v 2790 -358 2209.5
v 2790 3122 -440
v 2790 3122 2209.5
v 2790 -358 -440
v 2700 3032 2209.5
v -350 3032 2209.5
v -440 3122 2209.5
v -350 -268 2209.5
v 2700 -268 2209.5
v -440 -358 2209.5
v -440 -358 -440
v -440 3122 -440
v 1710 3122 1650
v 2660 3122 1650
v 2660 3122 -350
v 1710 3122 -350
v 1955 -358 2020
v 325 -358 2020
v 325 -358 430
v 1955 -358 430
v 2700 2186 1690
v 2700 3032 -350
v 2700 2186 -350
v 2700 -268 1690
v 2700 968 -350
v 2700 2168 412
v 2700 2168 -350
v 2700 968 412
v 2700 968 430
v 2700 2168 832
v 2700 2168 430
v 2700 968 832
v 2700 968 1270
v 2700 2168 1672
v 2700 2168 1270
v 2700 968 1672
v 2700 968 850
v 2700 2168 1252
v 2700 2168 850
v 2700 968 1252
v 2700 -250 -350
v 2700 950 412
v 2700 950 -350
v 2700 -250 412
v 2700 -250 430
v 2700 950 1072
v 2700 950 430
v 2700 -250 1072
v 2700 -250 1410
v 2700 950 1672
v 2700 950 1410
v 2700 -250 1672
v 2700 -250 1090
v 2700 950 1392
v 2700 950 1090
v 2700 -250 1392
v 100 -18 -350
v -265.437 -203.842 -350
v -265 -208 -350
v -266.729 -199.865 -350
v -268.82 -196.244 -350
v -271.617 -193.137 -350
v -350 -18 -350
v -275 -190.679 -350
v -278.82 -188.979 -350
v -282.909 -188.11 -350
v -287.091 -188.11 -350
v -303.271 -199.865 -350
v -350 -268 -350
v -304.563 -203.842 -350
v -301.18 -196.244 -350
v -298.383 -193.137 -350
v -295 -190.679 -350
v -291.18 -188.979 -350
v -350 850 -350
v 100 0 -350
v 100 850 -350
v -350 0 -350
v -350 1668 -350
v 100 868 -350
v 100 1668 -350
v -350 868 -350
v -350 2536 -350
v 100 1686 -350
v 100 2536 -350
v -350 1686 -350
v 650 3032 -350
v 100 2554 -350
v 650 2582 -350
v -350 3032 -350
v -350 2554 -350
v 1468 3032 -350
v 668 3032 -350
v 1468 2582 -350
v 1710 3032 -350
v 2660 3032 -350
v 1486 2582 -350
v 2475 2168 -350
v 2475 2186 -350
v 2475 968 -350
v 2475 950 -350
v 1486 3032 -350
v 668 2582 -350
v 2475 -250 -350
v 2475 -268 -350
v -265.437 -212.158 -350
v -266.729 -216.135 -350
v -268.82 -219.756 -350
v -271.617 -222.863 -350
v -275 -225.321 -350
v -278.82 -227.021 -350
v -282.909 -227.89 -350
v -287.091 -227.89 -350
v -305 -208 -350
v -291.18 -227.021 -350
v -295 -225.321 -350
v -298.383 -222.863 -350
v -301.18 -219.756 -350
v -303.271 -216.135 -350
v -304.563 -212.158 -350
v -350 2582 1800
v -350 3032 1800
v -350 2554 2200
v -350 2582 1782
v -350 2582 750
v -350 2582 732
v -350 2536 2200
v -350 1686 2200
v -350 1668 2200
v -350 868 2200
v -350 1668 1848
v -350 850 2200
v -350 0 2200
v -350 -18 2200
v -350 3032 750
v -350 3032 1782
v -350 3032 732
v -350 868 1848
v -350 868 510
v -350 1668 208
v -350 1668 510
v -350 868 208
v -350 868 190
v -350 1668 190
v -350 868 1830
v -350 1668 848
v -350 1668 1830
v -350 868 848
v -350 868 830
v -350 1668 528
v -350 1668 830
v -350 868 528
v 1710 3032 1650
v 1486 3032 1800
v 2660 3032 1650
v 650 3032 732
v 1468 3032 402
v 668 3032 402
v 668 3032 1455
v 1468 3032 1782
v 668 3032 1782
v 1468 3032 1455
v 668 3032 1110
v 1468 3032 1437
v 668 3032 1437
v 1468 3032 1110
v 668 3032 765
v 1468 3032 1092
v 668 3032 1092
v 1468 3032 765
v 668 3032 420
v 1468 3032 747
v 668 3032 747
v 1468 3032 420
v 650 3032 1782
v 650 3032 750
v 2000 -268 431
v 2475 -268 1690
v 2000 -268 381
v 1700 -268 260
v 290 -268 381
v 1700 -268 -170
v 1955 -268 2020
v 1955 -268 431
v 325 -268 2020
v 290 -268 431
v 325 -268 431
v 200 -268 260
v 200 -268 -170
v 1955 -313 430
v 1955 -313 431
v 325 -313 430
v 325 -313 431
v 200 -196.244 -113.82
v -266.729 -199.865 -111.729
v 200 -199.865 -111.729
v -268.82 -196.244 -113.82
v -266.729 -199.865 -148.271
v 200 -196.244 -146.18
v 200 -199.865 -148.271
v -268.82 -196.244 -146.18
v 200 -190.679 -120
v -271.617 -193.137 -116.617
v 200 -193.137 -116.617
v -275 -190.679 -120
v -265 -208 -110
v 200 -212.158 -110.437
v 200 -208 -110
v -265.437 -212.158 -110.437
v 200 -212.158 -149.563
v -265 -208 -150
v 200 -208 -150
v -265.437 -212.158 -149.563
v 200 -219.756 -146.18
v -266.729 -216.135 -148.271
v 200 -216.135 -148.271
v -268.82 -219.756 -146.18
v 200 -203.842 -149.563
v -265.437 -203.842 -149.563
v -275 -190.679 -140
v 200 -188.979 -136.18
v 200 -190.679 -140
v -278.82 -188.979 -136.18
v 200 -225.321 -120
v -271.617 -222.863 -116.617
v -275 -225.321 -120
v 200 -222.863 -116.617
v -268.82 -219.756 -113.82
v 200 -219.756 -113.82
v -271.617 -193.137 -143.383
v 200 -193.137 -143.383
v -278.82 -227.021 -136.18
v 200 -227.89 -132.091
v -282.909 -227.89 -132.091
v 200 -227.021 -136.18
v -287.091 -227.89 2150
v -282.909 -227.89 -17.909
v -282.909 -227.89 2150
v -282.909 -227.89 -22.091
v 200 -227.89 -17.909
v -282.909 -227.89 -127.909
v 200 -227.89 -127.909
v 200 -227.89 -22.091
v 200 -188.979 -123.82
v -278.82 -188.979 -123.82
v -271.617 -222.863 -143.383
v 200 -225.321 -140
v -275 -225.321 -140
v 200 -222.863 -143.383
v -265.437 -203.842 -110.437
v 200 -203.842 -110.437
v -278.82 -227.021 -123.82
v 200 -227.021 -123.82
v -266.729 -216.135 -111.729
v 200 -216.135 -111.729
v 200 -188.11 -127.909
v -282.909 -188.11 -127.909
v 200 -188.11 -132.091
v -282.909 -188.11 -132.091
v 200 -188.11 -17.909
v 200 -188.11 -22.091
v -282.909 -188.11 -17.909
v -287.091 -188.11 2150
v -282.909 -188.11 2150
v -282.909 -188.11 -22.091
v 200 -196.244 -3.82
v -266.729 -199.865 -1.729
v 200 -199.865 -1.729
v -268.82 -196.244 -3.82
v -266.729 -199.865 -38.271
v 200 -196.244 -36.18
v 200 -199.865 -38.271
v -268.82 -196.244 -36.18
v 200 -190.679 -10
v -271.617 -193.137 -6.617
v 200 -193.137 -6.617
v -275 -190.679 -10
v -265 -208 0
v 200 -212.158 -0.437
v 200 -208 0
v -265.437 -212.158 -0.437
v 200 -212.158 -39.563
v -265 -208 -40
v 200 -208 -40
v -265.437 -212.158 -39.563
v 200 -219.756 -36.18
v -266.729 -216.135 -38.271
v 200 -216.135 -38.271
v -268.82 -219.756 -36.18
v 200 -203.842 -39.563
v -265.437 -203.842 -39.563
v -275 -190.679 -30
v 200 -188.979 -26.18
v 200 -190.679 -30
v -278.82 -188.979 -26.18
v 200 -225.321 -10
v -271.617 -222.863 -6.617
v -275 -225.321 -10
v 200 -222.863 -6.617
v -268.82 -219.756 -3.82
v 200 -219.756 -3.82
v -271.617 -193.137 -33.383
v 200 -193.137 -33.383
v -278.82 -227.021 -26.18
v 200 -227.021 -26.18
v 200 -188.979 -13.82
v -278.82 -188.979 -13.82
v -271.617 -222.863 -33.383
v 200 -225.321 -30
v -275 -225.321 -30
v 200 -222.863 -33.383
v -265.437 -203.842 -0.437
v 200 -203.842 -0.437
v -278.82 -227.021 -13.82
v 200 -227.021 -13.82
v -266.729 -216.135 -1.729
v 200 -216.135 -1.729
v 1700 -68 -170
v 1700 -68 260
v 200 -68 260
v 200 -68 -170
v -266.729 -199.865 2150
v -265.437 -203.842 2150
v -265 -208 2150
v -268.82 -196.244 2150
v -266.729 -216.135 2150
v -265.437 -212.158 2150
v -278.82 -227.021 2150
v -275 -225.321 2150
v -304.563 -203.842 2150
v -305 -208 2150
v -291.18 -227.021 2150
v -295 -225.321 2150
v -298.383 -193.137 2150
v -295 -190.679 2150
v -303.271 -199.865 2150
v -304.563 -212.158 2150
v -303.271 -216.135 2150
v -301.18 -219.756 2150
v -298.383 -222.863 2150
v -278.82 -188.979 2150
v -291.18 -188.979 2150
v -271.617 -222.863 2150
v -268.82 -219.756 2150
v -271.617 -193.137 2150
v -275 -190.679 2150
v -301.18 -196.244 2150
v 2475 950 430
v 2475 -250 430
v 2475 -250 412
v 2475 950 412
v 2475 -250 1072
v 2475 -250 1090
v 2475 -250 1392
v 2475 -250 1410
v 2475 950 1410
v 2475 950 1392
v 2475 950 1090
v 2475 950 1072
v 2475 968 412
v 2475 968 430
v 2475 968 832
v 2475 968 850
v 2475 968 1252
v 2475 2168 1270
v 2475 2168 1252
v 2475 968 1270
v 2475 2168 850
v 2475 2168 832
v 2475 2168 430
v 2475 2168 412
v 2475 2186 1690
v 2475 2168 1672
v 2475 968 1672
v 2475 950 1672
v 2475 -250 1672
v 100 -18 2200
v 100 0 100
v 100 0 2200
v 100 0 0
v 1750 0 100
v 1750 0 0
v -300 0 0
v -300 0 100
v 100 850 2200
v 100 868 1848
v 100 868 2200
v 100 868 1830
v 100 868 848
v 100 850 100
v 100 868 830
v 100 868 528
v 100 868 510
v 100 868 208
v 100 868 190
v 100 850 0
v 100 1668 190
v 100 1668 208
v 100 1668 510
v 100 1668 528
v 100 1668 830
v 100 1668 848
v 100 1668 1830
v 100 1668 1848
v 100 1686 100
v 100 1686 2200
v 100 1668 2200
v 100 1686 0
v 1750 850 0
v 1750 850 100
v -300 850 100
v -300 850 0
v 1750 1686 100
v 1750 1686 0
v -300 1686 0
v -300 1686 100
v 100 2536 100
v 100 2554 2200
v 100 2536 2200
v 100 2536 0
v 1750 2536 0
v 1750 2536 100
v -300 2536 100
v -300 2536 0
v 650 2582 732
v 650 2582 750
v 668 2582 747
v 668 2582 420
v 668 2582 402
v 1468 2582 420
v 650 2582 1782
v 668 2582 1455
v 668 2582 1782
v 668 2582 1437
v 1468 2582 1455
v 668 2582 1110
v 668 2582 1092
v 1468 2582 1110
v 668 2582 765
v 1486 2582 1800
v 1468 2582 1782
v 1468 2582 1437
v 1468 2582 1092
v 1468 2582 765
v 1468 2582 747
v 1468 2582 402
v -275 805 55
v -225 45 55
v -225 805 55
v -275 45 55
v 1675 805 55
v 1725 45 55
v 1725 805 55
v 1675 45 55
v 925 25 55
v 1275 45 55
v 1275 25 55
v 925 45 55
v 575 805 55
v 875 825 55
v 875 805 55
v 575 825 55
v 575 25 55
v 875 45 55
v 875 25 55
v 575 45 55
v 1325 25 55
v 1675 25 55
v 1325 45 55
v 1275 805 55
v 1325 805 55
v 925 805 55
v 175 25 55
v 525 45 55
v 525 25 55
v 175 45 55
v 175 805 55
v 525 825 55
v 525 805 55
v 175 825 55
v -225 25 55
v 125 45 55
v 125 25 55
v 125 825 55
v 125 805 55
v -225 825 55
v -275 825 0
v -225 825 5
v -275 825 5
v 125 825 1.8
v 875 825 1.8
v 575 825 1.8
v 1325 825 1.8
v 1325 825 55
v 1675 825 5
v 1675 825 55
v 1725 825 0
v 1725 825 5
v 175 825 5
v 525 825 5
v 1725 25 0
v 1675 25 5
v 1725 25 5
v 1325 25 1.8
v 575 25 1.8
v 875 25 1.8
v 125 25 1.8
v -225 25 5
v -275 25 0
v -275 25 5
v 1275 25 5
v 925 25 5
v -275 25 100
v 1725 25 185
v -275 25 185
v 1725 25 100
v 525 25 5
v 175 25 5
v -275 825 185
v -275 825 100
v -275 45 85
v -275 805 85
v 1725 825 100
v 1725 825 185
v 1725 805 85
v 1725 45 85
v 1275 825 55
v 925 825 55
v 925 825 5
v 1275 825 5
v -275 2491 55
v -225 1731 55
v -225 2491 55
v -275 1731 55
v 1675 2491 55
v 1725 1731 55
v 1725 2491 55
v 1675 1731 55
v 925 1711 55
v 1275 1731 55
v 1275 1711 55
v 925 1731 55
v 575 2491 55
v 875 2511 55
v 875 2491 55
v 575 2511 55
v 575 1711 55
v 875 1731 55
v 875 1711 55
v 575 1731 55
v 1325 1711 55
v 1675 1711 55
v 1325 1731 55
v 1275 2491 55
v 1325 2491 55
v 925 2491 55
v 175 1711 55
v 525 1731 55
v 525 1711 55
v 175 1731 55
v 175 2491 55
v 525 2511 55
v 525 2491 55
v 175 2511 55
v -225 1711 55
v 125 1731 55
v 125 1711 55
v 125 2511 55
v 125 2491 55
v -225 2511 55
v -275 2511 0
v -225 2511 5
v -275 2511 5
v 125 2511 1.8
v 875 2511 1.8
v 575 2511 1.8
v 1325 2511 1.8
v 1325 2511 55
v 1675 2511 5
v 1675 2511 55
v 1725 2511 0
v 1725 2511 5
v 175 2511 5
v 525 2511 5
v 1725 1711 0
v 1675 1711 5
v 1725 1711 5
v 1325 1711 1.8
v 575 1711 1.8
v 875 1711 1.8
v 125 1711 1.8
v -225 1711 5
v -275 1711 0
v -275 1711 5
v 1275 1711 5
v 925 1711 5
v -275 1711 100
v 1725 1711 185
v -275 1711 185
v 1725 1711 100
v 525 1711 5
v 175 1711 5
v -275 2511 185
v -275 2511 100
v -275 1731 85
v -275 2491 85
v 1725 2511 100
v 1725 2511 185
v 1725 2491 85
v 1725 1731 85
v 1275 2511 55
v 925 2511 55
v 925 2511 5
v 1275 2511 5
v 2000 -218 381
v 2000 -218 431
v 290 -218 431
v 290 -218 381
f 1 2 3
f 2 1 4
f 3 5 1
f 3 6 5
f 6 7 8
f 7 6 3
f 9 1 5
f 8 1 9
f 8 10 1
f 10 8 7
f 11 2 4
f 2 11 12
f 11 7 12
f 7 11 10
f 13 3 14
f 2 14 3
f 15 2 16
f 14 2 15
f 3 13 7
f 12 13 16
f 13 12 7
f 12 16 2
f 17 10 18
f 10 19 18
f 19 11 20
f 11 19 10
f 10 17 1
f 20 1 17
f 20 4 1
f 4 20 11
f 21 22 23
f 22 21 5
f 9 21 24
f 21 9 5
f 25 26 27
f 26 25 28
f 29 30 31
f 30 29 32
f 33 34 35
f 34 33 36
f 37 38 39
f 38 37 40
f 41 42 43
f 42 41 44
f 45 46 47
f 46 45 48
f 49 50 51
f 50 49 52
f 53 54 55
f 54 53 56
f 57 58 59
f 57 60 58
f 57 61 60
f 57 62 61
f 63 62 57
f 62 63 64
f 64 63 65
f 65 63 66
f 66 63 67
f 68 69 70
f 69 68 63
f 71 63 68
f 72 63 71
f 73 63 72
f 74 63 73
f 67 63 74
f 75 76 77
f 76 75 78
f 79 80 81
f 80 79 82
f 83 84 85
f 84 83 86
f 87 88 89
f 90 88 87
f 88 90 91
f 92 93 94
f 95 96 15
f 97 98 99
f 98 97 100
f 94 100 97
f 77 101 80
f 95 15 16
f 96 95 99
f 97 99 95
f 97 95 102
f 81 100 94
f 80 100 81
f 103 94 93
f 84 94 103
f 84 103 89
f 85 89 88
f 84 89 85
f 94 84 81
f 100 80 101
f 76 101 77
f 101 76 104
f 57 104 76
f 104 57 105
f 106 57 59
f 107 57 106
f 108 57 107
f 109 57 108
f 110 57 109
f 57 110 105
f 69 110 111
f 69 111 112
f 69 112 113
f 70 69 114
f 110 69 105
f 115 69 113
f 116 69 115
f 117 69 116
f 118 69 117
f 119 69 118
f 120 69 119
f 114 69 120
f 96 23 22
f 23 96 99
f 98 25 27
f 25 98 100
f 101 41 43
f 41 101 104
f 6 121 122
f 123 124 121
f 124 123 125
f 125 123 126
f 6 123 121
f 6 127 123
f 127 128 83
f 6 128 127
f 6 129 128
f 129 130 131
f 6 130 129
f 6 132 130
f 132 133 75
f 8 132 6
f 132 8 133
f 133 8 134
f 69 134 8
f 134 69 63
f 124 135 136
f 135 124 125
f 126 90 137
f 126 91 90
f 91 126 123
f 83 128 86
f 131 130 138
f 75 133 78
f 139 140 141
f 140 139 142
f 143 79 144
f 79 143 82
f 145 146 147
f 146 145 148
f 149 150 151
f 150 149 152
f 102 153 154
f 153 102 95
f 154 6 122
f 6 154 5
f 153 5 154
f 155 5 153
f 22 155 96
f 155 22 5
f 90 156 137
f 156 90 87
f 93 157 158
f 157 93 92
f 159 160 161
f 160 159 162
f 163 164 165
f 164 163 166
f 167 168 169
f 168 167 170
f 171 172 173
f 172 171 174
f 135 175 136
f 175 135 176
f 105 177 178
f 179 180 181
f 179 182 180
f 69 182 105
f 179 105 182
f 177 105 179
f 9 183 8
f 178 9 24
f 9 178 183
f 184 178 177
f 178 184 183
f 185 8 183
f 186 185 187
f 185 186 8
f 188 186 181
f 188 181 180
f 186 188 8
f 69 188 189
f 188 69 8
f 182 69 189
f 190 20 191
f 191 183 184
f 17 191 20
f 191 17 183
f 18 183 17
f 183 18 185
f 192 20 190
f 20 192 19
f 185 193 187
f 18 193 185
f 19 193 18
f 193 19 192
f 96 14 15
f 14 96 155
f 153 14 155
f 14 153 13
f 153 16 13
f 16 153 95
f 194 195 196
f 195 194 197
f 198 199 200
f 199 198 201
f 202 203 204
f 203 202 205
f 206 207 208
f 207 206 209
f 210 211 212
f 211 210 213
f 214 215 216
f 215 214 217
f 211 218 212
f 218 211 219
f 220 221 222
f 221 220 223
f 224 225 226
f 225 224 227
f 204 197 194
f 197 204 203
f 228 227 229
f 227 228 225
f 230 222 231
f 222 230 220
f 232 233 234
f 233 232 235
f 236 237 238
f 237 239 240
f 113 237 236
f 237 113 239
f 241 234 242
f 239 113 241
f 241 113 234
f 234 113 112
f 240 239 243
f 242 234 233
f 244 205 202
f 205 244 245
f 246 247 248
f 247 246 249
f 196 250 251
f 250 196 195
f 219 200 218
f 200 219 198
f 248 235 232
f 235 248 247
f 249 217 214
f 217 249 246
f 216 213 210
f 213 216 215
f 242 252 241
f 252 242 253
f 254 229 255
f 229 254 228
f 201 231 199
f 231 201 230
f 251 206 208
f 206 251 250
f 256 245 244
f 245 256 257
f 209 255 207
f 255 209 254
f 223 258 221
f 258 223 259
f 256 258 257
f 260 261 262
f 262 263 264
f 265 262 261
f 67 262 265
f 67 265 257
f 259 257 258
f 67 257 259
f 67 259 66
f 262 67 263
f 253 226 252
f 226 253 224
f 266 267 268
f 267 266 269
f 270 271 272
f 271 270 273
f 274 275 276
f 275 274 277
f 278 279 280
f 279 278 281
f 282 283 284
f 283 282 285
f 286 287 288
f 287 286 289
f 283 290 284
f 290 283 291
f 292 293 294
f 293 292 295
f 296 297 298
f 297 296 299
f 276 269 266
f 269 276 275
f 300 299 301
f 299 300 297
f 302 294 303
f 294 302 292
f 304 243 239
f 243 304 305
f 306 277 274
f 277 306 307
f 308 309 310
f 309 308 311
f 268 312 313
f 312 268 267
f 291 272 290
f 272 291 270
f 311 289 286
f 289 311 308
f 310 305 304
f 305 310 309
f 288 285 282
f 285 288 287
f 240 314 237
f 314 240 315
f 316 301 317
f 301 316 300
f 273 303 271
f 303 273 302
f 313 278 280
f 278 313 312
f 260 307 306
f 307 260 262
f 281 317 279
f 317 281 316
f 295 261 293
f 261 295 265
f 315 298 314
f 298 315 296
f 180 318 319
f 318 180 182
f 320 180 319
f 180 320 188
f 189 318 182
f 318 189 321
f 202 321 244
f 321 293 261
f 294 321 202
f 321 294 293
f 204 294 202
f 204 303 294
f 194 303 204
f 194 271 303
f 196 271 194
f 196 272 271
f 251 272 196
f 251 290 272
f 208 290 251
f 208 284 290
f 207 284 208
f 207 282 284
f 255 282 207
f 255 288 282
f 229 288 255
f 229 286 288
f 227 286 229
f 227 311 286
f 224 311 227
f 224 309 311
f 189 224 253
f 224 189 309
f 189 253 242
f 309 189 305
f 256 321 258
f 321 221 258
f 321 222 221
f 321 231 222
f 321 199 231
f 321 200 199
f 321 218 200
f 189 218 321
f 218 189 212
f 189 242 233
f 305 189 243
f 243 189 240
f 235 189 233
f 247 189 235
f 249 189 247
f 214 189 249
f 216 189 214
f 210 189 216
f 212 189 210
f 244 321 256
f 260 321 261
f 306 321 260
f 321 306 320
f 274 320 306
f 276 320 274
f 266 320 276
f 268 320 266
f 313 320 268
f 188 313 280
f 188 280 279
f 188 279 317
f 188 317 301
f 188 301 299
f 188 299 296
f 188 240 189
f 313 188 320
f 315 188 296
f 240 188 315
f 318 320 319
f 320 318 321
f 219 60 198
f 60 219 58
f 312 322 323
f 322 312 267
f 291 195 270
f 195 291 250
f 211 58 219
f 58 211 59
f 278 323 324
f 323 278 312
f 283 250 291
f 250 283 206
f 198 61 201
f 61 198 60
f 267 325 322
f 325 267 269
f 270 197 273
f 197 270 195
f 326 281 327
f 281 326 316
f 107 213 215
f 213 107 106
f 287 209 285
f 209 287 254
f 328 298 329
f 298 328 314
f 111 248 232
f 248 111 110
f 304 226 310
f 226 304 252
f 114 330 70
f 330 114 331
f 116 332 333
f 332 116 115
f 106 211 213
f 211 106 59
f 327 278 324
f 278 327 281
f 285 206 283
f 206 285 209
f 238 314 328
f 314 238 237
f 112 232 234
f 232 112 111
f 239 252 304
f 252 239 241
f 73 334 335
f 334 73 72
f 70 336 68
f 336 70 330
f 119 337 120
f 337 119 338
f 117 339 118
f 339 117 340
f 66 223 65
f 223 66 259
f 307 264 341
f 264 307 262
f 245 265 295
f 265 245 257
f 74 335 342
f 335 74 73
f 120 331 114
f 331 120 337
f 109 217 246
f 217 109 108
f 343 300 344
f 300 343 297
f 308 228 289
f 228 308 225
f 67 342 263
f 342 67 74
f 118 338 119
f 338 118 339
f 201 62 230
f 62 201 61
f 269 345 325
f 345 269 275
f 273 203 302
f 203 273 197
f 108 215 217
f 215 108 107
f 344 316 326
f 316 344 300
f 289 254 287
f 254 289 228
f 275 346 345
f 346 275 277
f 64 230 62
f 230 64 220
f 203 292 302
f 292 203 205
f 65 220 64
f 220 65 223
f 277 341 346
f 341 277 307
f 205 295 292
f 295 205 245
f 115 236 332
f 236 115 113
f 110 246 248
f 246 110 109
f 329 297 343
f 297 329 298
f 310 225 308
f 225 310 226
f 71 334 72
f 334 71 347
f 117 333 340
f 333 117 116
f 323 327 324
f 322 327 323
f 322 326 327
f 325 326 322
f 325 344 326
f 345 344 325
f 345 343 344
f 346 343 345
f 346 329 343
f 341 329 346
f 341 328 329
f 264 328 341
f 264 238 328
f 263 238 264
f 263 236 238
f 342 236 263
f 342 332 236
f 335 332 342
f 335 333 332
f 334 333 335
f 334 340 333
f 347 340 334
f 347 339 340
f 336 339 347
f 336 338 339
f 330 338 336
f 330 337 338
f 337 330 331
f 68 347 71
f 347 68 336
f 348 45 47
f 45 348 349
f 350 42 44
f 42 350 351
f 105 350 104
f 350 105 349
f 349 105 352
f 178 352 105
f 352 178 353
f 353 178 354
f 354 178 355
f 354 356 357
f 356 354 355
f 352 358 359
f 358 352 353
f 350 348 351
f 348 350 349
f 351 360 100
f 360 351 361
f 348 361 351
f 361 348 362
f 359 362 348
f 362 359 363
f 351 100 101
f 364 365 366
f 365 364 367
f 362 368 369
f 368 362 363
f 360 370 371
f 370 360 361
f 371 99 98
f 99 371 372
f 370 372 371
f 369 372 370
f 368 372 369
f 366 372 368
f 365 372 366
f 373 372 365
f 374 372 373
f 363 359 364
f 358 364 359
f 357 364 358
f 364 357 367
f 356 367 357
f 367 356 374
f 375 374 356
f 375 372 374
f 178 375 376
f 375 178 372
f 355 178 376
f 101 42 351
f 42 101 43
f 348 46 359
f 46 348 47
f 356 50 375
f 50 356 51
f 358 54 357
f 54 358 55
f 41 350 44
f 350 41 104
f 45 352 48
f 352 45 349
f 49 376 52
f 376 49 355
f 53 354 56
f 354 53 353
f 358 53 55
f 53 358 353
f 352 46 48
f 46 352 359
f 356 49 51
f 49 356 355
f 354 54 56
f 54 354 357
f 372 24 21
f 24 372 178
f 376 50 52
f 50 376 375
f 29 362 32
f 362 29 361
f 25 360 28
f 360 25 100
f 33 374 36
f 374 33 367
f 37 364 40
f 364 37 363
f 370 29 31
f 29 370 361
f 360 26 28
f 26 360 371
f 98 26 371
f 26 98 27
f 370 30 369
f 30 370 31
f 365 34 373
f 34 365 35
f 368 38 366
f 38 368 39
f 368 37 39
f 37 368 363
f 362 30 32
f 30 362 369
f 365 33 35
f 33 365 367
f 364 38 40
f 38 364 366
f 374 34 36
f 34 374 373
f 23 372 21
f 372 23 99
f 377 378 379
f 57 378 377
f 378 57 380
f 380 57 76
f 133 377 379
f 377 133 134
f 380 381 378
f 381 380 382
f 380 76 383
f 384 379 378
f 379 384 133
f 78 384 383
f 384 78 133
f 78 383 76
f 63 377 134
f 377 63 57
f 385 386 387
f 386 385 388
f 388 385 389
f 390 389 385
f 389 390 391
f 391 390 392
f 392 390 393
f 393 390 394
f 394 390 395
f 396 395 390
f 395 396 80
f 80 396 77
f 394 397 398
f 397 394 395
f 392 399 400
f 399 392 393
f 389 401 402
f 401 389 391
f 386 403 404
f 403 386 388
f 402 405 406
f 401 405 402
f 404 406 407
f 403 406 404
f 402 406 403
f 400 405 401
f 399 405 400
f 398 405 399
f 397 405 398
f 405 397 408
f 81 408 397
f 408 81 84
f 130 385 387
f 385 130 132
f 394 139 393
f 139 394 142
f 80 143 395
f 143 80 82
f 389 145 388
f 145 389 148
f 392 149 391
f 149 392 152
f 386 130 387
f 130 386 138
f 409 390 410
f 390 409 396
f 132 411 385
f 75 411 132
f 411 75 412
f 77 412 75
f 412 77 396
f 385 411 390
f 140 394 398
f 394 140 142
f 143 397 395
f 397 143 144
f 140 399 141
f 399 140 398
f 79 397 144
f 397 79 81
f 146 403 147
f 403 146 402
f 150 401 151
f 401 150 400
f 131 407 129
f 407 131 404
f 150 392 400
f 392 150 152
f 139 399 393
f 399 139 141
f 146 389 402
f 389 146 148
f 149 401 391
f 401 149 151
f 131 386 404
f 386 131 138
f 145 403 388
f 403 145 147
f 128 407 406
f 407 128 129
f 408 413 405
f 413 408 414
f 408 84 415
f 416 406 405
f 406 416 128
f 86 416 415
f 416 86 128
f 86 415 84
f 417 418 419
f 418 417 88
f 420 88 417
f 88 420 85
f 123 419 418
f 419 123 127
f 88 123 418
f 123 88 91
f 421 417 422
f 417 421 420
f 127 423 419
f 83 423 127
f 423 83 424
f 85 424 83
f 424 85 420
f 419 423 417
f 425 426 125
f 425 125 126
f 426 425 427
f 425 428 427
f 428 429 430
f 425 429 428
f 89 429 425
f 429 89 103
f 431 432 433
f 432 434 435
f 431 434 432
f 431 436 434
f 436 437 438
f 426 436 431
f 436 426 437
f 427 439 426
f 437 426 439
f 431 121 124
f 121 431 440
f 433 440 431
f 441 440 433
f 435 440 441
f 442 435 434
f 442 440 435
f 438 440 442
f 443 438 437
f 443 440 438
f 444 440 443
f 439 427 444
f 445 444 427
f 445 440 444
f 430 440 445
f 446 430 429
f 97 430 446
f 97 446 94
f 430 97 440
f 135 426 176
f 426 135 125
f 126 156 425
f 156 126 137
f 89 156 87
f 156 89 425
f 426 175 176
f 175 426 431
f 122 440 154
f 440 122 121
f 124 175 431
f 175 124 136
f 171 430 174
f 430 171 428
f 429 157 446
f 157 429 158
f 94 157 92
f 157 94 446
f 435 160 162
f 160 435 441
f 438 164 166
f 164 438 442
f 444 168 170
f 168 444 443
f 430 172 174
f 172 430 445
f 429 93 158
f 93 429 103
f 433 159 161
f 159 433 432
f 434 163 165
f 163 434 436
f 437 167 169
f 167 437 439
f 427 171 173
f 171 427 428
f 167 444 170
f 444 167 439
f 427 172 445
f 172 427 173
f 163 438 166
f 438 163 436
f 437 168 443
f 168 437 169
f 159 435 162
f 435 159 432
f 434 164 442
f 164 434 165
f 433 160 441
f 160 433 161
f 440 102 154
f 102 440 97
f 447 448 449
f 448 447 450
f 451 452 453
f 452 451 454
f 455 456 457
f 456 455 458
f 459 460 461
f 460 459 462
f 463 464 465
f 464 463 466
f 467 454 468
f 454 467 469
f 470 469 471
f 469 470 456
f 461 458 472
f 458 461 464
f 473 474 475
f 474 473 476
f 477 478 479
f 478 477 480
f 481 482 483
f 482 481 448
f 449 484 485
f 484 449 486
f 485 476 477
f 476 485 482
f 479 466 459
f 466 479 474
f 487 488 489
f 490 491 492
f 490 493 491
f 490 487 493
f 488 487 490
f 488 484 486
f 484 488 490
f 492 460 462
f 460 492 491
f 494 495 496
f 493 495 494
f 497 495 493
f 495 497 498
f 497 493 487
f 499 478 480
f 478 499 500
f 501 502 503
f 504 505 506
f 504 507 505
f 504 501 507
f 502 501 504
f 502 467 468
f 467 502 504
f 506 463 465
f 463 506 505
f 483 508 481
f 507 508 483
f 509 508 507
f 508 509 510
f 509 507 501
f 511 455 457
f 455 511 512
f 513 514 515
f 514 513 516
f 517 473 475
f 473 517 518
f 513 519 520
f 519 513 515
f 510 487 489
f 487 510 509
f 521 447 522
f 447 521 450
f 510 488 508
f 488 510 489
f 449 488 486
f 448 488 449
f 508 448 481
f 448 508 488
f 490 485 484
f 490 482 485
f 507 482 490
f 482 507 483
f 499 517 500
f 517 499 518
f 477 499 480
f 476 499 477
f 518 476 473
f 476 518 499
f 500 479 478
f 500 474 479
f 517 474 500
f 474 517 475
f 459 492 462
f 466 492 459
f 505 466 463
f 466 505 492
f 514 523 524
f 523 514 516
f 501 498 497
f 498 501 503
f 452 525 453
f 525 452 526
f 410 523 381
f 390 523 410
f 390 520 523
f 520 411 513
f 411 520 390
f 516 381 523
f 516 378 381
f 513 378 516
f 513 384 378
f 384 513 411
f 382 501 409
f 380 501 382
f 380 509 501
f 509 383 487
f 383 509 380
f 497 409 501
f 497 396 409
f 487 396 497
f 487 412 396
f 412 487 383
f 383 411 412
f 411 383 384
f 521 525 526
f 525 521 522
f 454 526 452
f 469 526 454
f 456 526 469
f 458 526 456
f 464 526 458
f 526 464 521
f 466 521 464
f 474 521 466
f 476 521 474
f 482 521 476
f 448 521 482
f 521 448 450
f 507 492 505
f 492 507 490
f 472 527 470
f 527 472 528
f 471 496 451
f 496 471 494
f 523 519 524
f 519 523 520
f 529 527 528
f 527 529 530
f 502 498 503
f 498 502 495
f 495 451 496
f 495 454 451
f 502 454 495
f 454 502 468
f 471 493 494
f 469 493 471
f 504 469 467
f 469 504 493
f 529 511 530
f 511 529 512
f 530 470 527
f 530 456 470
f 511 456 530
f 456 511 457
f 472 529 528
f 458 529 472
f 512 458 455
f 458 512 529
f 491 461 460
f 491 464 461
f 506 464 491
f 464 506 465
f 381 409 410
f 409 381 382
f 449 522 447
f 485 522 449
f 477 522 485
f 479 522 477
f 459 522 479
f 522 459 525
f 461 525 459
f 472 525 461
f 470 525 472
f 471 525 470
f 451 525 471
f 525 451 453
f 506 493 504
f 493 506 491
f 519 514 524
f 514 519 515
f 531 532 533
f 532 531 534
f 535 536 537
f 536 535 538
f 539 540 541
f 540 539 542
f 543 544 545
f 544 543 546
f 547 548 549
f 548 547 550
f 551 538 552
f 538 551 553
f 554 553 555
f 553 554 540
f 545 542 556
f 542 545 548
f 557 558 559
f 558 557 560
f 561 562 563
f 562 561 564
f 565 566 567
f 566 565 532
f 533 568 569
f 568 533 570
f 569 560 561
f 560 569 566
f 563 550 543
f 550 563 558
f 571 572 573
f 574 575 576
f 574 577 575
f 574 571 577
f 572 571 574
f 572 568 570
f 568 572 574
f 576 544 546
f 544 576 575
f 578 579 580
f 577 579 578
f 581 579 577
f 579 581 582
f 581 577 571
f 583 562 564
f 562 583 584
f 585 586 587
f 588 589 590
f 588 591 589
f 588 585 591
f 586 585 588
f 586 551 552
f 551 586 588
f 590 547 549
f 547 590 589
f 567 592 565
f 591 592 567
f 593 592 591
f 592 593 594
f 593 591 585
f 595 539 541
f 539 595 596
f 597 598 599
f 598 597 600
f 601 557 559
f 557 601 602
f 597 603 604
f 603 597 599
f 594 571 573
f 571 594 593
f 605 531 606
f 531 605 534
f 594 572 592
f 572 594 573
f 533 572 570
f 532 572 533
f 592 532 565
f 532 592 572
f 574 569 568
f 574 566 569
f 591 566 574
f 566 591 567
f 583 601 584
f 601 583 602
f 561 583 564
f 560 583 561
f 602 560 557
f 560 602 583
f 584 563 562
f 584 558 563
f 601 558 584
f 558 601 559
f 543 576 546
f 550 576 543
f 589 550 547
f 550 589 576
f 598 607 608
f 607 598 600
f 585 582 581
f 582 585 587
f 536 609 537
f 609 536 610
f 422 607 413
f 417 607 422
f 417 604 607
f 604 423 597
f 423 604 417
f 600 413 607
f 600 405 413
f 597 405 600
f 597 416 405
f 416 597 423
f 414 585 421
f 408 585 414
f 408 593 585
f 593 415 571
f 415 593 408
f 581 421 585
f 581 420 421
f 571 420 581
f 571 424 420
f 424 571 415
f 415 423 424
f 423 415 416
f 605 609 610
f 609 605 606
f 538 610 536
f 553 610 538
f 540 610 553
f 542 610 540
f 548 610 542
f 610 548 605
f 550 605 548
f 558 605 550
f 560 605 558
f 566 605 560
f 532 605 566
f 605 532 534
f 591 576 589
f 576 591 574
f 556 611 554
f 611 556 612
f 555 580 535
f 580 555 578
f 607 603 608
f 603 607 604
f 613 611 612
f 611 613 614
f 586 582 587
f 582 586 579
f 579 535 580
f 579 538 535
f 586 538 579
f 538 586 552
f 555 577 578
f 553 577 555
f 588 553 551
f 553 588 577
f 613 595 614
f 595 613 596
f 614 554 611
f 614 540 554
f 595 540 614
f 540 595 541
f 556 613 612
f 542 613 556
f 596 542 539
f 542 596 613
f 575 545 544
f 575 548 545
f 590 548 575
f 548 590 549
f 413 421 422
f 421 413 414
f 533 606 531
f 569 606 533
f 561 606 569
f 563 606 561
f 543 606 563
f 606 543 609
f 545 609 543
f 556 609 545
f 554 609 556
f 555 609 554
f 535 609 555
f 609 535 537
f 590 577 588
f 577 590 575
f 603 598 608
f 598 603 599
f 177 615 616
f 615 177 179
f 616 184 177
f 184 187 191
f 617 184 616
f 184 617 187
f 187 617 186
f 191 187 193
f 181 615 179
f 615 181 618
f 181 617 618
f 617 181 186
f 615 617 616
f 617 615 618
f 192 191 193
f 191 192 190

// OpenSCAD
// My dictionary of this project
	// length (or Y-axis size) = L;
	// width (or X-axis size) = W;
	// hight (or Z-axis size) = H;

	// X-axis shift = dX (from windom to door);
	// Y-axis shift = dY (view the window from right to left);
	// Z-axis shift = dZ (from floor to ceiling);

	// color = clr;

	// Room = RM; wall = w; window = WD; door = DR;
	// windowsill = WS; radiator = RDR;
	
	// BookShelf = BS; shelf = s; rack = r;
	// Bad = BD; desk = DSK;
	x = -350;
	y = -268;
	z = -350;
{
	//====================================================
	// draw for all of room
	
	RM_H = 2560; // by Z-axis
	RM_L = 3300; // by Y-axis
	RM_W = 3050; // by X-axis
	RM_clr = "lightsalmon";
	w_W = 90; // wall`s thickness

	WD_H = 1590; WD_L = 1630; WD_W = w_W * 2;
	WD_dX = 675; WD_dY = -WD_W * 0.75; WD_dZ = 780;

	DR_H = 2000; DR_L = 950; DR_W = w_W * 2;
	DR_dX = RM_W - DR_L - 40;
	DR_dY = RM_L - DR_W * 0.25; DR_dZ = 0;
	 
	translate([x,y,z])
	RM_draw();

	module RM_draw(){
		color(RM_clr, 1)
		difference()	{
			RM_base_draw();
			RM_wind_draw();
	 		RM_door_draw();}}

	module RM_base_draw(){
		difference(){
			// base for draw walls of room
		    translate([-w_W, -w_W, -w_W])
		    cube([RM_W + 2 * w_W, RM_L + 2 * w_W, RM_H + w_W - 0.5]);
		    // base for room self
		    translate([0, 0, 0])
		    cube([RM_W, RM_L, RM_H]);}}

	module RM_wind_draw(){
	    // base for draw window
	    translate([WD_dX, WD_dY, WD_dZ])
	    cube([WD_L, WD_W, WD_H]);}

	module RM_door_draw(){
	    // base for door
	    translate([DR_dX, DR_dY, DR_dZ])
	    cube([DR_L, DR_W, DR_H]);}
	//====================================================
	// draw windowsill
	WS_L = 1710;
	WS_W = 95;
	WS_H = 50;
	WS_di = [640, -45, 731];

	
	translate([x,y,z])
	color("white", 1)
	rotate([0, 0, 0])
	translate([WS_di[0], WS_di[1], WS_di[2]])
	cube([WS_L, WS_W, WS_H]);
	// ===========================================================
	// draw radiator set
	RDR_L = 1500;
	RDR_W = 200;
	RDR_H = 430;
	RDR_di = [550, 0, 180];

	
	translate([x,y,z])
	color("white", 1){
	// !!! draw radiator !!!
	    rotate([0, 0, 0])
	    translate([RDR_di[0], RDR_di[1], RDR_di[2]])
	    cube([RDR_L, RDR_W, RDR_H]);
	// !!! draw vertical tube !!!
	    rotate([0, 0, 0])
	    translate([65, 60, 0])
	    cylinder(r=20, h=2500, center=false);
	// !!! draw horizontal tube !!! h = [22, 33]cm
	    for(dZ=[220, 330]){
	        translate([65, 60, dZ])
	        rotate([0, 90, 0])
	        cylinder(r=20, h=RDR_di[0], center=false);}}
	

	//====================================================
	// narrow shelf = N; wide shelf = W;
	N = 225; W = 450;

	// BS01 - near window; BS02 - next by BS01;
	// BS03 - between bads; BS04 - near wardrobe;
	// BS03_l and BS03_r - bad as BS (rack without selves) 
	r_BS_clr = "lightyellow";
	s_BS_clr = "violet";
	desk_thick = 18;

	s_001_L = 1200;
	BD_W = 850;

	// BS01
	BS01_L = s_001_L; BS01_W = N;
	s_BS01_H = [780, 1440, 1760, 2040];
	r_BS01_H = [2040, 2040];
	BS01_di = [RM_W-BS01_W, 0, 0]; // dX, dY, dZ
	length_BS01 = BS01_L + (r_BS01_H[0] == 0 ? 0 : desk_thick) + (r_BS01_H[1] == 0 ? 0 : desk_thick);

	// BS02
	BS02_L = s_001_L; BS02_W = N;
	s_BS02_H = [780, 1200, 1620, 2040];
	r_BS02_H = [0, 2040];
	BS02_di = [RM_W-BS01_W, length_BS01, 0]; // dX, dY, dZ

	// BS03_l
	BS03_l_L = BD_W; BS03_l_W = W;
	s_BS03_l_H = [];
	r_BS03_l_H = [2550, 2550];
	BS03_l_di = [0, 250, 0]; // dX, dY, dZ
	length_BS03_l = BS03_l_L + (r_BS03_l_H[0] == 0 ? 0 : desk_thick) + (r_BS03_l_H[1] == 0 ? 0 : desk_thick);
	//echo(length_BS03_l);

	// BS03
	BS03_L = 800; BS03_W = W;
	s_BS03_H = [558, 878, 1198, 2198];
	r_BS03_H = [0, 0];
	BS03_di = [0, length_BS03_l+BS03_l_di[1], 0]; // dX, dY, dZ
	length_BS03 = BS03_L + (r_BS03_H[0] == 0 ? 0 : desk_thick) + (r_BS03_H[1] == 0 ? 0 : desk_thick);

	// BS03_r
	BS03_r_L = BD_W; BS03_r_W = W;
	s_BS03_r_H = [];
	r_BS03_r_H = [2550, 2550];
	BS03_r_di = [0, length_BS03_l+BS03_l_di[1]+length_BS03, 0]; // dX, dY, dZ
	length_BS03_r = BS03_r_L + (r_BS03_r_H[0] == 0 ? 0 : desk_thick) + (r_BS03_r_H[1] == 0 ? 0 : desk_thick);

	// BS04_l
	BS04_l_L = 1000; BS04_l_W = W;
	s_BS04_l_H = [1100, 2150];
	r_BS04_l_H = [0, 0];
	BS04_l_di = [-RM_L, 0, 0]; // dX, dY, dZ
	length_BS04_l = BS04_l_L + (r_BS04_l_H[0] == 0 ? 0 : desk_thick) + (r_BS04_l_H[1] == 0 ? 0 : desk_thick);

	// BS04
	BS04_L = 800; BS04_W = W;
	s_BS04_H = [770, 1115, 1460, 1805, 2150];
	r_BS04_H = [2150, 2150];
	BS04_di = [-RM_L, length_BS04_l, 0]; // dX, dY, dZ

	module BS_draw(BS_W, s_BS_L, s_BS_H, r_BS_H, BS_di, angle)
	{
		rotate([0,0,angle]){
			translate(BS_di){
			    for(j=[0, 2, 1]){
			        if(j<2){
			            ds = r_BS_H[0] == 0 ? 0 : desk_thick;
			            translate([0,(s_BS_L+ds)*j,0])
			            color(r_BS_clr, 1)
			            cube([BS_W, desk_thick, r_BS_H[j]]);}
			        else{
				        for(h=s_BS_H){
				    		ds = r_BS_H[0] == 0 ? 0 : desk_thick;
				    		translate([0,ds,h-desk_thick])
				        	shelf_draw(BS_W, s_BS_L);}}}}}
	}

	module shelf_draw(BS_W, s_BS_L)
	{
	    color(s_BS_clr, 1)
	    cube([BS_W, s_BS_L, desk_thick]);
	}

	translate([x,y,z]){

	BS_draw(BS01_W, BS01_L, s_BS01_H, r_BS01_H, BS01_di);
	BS_draw(BS02_W, BS02_L, s_BS02_H, r_BS02_H, BS02_di);
	BS_draw(BS03_l_W, BS03_l_L, s_BS03_l_H, r_BS03_l_H, BS03_l_di);
	BS_draw(BS03_W, BS03_L, s_BS03_H, r_BS03_H, BS03_di);
	BS_draw(BS03_r_W, BS03_r_L, s_BS03_r_H, r_BS03_r_H, BS03_r_di);
	BS_draw(BS04_l_W, BS04_l_L, s_BS04_l_H, r_BS04_l_H, BS04_l_di, -90);
	BS_draw(BS04_W, BS04_L, s_BS04_H, r_BS04_H, BS04_di, -90);
	}
	//====================================================
	// draw base DSC
	//b_DSK_L = 1500;
	//b_DSK_W = N;
	//b_DSK_H = desk_thick;
	//b_DSK_di = [2780, 60, 780-desk_thick];

	//translate([b_DSK_di[0], b_DSK_di[1], b_DSK_di[2]])
	//rotate([0, 0, 90])
	//shelf_draw(b_DSK_W, b_DSK_L);

	// draw move DSC
	//m_DSK_L = 1500;
	//m_DSK_W = W;
	//m_DSK_H = desk_thick;
	//m_DSK_di = [2780, 60+b_DSK_W, 780-desk_thick];

	//translate([m_DSK_di[0], m_DSK_di[1], m_DSK_di[2]])
	//rotate([0, 0, 90])
	//color("red", 1)
	//cube([m_DSK_W, m_DSK_L, desk_thick]);
	}

//====================================================
// DRAW BED
	{// My dictionary of this project
		// length (or Y-axis size) = L;
		// width (or X-axis size) = W;
		// hight (or Z-axis size) = H;

		// X-axis shift = dX (from windom to door);
		// Y-axis shift = dY (view the window from right to left);
		// Z-axis shift = dZ (from floor to ceiling);

		// color = clr;

		// side part =
		//			SPi for inner;
		//			SPo for outer;
		//			SPt for transverse;
		// plywood = PW; Bad = BD;
		
	//====================================================
	// draw outer side part

		SPo_clr = "yellow";
		SPo_W = 25;
		SPo_H = 100;
		SPo_L = 2000;

	module SPo_draw(length){
		color(SPo_clr, 1)
		cube([length, SPo_W, SPo_H]);}
	module SPo_draw_green(length){
		color("green", 1)
		cube([length, SPo_W, SPo_H]);}

	//====================================================
	// draw inner side part

		SPi_clr = "orange";
		SPi_W = 20;
		SPi_H = 30;
		SPi_L = SPo_L;

	module SPi_draw(length){
		color(SPi_clr, 1)
		cube([length, SPi_W, SPi_H]);}

	//====================================================
	// draw transverse side part

		SPt_clr = "brown";
		SPt_W = 50;
		SPt_H = 50;
		SPt_L = 800;

	module SPt_draw(length){
		color(SPt_clr, 1)
		cube([length, SPt_W, SPt_H]);}

	//====================================================
	// draw one plywood

		PW_clr = "red";
		PW_H = 3.2;
		PW_W = 800;
		PW_L = 450;

	module PW_draw(length, width){
		color(PW_clr, 1)
		cube([length, width, PW_H]);}

	//====================================================
	// draw bad

	// draw 1/2 frame
	module piece_1_BD_draw(){

		l1 = SPo_L;
		l2 = SPt_L + 2 * SPo_W;
		l2_1 = SPt_L;
		l3 = SPi_L;

		// draw outer detail
			translate([SPo_W, 0, 0])
				SPo_draw(l1);
		
		// draw transverse outer detail
			translate([SPo_W, 0, 0])
				rotate([0, 0, 90])
					SPo_draw_green(l2);

		// draw inner detail
			translate([SPo_W, SPo_W, SPo_H - SPi_H - 15])
				SPi_draw(l3);

		// draw transverse details
			for (i=[0:2]){
				translate([SPt_W + SPo_W + i * 400, SPo_W, 5])
					rotate([0, 0, 90])
						SPt_draw(l2_1);}

		// draw 1/2 plywood
			x = PW_L;
			y = PW_W;
			translate([SPo_W + 400, SPo_W, 5 - PW_H])
				PW_draw(x, y);}

	//====================================================
	// draw mattress

	module mattress(){

		L_m = 2000;
		H_m = 100;
		W_m = 800;
		clr_m = "pink";

		translate([SPo_W, SPo_W, SPo_H - 15])
			color(clr_m, 1)
				cube([L_m, W_m, H_m]);}
	}

//====================================================
// TURN ANIMATION
//rotate([0, -$t*90, 0])
rotate([0, -$t*90, 0])
translate([-300, 0, 0])
{
piece_1_BD_draw();
mattress();
translate([2000 + 2 * SPo_W, 800 + 2 * SPo_W, 0])
	rotate([0,0,180])
		piece_1_BD_draw();
}

rotate([0, -$t*90, 0])
translate([-300, 1686, 0])
{
piece_1_BD_draw();
mattress();
translate([2000 + 2 * SPo_W, 800 + 2 * SPo_W, 0])
	rotate([0,0,180])
		piece_1_BD_draw();
}
